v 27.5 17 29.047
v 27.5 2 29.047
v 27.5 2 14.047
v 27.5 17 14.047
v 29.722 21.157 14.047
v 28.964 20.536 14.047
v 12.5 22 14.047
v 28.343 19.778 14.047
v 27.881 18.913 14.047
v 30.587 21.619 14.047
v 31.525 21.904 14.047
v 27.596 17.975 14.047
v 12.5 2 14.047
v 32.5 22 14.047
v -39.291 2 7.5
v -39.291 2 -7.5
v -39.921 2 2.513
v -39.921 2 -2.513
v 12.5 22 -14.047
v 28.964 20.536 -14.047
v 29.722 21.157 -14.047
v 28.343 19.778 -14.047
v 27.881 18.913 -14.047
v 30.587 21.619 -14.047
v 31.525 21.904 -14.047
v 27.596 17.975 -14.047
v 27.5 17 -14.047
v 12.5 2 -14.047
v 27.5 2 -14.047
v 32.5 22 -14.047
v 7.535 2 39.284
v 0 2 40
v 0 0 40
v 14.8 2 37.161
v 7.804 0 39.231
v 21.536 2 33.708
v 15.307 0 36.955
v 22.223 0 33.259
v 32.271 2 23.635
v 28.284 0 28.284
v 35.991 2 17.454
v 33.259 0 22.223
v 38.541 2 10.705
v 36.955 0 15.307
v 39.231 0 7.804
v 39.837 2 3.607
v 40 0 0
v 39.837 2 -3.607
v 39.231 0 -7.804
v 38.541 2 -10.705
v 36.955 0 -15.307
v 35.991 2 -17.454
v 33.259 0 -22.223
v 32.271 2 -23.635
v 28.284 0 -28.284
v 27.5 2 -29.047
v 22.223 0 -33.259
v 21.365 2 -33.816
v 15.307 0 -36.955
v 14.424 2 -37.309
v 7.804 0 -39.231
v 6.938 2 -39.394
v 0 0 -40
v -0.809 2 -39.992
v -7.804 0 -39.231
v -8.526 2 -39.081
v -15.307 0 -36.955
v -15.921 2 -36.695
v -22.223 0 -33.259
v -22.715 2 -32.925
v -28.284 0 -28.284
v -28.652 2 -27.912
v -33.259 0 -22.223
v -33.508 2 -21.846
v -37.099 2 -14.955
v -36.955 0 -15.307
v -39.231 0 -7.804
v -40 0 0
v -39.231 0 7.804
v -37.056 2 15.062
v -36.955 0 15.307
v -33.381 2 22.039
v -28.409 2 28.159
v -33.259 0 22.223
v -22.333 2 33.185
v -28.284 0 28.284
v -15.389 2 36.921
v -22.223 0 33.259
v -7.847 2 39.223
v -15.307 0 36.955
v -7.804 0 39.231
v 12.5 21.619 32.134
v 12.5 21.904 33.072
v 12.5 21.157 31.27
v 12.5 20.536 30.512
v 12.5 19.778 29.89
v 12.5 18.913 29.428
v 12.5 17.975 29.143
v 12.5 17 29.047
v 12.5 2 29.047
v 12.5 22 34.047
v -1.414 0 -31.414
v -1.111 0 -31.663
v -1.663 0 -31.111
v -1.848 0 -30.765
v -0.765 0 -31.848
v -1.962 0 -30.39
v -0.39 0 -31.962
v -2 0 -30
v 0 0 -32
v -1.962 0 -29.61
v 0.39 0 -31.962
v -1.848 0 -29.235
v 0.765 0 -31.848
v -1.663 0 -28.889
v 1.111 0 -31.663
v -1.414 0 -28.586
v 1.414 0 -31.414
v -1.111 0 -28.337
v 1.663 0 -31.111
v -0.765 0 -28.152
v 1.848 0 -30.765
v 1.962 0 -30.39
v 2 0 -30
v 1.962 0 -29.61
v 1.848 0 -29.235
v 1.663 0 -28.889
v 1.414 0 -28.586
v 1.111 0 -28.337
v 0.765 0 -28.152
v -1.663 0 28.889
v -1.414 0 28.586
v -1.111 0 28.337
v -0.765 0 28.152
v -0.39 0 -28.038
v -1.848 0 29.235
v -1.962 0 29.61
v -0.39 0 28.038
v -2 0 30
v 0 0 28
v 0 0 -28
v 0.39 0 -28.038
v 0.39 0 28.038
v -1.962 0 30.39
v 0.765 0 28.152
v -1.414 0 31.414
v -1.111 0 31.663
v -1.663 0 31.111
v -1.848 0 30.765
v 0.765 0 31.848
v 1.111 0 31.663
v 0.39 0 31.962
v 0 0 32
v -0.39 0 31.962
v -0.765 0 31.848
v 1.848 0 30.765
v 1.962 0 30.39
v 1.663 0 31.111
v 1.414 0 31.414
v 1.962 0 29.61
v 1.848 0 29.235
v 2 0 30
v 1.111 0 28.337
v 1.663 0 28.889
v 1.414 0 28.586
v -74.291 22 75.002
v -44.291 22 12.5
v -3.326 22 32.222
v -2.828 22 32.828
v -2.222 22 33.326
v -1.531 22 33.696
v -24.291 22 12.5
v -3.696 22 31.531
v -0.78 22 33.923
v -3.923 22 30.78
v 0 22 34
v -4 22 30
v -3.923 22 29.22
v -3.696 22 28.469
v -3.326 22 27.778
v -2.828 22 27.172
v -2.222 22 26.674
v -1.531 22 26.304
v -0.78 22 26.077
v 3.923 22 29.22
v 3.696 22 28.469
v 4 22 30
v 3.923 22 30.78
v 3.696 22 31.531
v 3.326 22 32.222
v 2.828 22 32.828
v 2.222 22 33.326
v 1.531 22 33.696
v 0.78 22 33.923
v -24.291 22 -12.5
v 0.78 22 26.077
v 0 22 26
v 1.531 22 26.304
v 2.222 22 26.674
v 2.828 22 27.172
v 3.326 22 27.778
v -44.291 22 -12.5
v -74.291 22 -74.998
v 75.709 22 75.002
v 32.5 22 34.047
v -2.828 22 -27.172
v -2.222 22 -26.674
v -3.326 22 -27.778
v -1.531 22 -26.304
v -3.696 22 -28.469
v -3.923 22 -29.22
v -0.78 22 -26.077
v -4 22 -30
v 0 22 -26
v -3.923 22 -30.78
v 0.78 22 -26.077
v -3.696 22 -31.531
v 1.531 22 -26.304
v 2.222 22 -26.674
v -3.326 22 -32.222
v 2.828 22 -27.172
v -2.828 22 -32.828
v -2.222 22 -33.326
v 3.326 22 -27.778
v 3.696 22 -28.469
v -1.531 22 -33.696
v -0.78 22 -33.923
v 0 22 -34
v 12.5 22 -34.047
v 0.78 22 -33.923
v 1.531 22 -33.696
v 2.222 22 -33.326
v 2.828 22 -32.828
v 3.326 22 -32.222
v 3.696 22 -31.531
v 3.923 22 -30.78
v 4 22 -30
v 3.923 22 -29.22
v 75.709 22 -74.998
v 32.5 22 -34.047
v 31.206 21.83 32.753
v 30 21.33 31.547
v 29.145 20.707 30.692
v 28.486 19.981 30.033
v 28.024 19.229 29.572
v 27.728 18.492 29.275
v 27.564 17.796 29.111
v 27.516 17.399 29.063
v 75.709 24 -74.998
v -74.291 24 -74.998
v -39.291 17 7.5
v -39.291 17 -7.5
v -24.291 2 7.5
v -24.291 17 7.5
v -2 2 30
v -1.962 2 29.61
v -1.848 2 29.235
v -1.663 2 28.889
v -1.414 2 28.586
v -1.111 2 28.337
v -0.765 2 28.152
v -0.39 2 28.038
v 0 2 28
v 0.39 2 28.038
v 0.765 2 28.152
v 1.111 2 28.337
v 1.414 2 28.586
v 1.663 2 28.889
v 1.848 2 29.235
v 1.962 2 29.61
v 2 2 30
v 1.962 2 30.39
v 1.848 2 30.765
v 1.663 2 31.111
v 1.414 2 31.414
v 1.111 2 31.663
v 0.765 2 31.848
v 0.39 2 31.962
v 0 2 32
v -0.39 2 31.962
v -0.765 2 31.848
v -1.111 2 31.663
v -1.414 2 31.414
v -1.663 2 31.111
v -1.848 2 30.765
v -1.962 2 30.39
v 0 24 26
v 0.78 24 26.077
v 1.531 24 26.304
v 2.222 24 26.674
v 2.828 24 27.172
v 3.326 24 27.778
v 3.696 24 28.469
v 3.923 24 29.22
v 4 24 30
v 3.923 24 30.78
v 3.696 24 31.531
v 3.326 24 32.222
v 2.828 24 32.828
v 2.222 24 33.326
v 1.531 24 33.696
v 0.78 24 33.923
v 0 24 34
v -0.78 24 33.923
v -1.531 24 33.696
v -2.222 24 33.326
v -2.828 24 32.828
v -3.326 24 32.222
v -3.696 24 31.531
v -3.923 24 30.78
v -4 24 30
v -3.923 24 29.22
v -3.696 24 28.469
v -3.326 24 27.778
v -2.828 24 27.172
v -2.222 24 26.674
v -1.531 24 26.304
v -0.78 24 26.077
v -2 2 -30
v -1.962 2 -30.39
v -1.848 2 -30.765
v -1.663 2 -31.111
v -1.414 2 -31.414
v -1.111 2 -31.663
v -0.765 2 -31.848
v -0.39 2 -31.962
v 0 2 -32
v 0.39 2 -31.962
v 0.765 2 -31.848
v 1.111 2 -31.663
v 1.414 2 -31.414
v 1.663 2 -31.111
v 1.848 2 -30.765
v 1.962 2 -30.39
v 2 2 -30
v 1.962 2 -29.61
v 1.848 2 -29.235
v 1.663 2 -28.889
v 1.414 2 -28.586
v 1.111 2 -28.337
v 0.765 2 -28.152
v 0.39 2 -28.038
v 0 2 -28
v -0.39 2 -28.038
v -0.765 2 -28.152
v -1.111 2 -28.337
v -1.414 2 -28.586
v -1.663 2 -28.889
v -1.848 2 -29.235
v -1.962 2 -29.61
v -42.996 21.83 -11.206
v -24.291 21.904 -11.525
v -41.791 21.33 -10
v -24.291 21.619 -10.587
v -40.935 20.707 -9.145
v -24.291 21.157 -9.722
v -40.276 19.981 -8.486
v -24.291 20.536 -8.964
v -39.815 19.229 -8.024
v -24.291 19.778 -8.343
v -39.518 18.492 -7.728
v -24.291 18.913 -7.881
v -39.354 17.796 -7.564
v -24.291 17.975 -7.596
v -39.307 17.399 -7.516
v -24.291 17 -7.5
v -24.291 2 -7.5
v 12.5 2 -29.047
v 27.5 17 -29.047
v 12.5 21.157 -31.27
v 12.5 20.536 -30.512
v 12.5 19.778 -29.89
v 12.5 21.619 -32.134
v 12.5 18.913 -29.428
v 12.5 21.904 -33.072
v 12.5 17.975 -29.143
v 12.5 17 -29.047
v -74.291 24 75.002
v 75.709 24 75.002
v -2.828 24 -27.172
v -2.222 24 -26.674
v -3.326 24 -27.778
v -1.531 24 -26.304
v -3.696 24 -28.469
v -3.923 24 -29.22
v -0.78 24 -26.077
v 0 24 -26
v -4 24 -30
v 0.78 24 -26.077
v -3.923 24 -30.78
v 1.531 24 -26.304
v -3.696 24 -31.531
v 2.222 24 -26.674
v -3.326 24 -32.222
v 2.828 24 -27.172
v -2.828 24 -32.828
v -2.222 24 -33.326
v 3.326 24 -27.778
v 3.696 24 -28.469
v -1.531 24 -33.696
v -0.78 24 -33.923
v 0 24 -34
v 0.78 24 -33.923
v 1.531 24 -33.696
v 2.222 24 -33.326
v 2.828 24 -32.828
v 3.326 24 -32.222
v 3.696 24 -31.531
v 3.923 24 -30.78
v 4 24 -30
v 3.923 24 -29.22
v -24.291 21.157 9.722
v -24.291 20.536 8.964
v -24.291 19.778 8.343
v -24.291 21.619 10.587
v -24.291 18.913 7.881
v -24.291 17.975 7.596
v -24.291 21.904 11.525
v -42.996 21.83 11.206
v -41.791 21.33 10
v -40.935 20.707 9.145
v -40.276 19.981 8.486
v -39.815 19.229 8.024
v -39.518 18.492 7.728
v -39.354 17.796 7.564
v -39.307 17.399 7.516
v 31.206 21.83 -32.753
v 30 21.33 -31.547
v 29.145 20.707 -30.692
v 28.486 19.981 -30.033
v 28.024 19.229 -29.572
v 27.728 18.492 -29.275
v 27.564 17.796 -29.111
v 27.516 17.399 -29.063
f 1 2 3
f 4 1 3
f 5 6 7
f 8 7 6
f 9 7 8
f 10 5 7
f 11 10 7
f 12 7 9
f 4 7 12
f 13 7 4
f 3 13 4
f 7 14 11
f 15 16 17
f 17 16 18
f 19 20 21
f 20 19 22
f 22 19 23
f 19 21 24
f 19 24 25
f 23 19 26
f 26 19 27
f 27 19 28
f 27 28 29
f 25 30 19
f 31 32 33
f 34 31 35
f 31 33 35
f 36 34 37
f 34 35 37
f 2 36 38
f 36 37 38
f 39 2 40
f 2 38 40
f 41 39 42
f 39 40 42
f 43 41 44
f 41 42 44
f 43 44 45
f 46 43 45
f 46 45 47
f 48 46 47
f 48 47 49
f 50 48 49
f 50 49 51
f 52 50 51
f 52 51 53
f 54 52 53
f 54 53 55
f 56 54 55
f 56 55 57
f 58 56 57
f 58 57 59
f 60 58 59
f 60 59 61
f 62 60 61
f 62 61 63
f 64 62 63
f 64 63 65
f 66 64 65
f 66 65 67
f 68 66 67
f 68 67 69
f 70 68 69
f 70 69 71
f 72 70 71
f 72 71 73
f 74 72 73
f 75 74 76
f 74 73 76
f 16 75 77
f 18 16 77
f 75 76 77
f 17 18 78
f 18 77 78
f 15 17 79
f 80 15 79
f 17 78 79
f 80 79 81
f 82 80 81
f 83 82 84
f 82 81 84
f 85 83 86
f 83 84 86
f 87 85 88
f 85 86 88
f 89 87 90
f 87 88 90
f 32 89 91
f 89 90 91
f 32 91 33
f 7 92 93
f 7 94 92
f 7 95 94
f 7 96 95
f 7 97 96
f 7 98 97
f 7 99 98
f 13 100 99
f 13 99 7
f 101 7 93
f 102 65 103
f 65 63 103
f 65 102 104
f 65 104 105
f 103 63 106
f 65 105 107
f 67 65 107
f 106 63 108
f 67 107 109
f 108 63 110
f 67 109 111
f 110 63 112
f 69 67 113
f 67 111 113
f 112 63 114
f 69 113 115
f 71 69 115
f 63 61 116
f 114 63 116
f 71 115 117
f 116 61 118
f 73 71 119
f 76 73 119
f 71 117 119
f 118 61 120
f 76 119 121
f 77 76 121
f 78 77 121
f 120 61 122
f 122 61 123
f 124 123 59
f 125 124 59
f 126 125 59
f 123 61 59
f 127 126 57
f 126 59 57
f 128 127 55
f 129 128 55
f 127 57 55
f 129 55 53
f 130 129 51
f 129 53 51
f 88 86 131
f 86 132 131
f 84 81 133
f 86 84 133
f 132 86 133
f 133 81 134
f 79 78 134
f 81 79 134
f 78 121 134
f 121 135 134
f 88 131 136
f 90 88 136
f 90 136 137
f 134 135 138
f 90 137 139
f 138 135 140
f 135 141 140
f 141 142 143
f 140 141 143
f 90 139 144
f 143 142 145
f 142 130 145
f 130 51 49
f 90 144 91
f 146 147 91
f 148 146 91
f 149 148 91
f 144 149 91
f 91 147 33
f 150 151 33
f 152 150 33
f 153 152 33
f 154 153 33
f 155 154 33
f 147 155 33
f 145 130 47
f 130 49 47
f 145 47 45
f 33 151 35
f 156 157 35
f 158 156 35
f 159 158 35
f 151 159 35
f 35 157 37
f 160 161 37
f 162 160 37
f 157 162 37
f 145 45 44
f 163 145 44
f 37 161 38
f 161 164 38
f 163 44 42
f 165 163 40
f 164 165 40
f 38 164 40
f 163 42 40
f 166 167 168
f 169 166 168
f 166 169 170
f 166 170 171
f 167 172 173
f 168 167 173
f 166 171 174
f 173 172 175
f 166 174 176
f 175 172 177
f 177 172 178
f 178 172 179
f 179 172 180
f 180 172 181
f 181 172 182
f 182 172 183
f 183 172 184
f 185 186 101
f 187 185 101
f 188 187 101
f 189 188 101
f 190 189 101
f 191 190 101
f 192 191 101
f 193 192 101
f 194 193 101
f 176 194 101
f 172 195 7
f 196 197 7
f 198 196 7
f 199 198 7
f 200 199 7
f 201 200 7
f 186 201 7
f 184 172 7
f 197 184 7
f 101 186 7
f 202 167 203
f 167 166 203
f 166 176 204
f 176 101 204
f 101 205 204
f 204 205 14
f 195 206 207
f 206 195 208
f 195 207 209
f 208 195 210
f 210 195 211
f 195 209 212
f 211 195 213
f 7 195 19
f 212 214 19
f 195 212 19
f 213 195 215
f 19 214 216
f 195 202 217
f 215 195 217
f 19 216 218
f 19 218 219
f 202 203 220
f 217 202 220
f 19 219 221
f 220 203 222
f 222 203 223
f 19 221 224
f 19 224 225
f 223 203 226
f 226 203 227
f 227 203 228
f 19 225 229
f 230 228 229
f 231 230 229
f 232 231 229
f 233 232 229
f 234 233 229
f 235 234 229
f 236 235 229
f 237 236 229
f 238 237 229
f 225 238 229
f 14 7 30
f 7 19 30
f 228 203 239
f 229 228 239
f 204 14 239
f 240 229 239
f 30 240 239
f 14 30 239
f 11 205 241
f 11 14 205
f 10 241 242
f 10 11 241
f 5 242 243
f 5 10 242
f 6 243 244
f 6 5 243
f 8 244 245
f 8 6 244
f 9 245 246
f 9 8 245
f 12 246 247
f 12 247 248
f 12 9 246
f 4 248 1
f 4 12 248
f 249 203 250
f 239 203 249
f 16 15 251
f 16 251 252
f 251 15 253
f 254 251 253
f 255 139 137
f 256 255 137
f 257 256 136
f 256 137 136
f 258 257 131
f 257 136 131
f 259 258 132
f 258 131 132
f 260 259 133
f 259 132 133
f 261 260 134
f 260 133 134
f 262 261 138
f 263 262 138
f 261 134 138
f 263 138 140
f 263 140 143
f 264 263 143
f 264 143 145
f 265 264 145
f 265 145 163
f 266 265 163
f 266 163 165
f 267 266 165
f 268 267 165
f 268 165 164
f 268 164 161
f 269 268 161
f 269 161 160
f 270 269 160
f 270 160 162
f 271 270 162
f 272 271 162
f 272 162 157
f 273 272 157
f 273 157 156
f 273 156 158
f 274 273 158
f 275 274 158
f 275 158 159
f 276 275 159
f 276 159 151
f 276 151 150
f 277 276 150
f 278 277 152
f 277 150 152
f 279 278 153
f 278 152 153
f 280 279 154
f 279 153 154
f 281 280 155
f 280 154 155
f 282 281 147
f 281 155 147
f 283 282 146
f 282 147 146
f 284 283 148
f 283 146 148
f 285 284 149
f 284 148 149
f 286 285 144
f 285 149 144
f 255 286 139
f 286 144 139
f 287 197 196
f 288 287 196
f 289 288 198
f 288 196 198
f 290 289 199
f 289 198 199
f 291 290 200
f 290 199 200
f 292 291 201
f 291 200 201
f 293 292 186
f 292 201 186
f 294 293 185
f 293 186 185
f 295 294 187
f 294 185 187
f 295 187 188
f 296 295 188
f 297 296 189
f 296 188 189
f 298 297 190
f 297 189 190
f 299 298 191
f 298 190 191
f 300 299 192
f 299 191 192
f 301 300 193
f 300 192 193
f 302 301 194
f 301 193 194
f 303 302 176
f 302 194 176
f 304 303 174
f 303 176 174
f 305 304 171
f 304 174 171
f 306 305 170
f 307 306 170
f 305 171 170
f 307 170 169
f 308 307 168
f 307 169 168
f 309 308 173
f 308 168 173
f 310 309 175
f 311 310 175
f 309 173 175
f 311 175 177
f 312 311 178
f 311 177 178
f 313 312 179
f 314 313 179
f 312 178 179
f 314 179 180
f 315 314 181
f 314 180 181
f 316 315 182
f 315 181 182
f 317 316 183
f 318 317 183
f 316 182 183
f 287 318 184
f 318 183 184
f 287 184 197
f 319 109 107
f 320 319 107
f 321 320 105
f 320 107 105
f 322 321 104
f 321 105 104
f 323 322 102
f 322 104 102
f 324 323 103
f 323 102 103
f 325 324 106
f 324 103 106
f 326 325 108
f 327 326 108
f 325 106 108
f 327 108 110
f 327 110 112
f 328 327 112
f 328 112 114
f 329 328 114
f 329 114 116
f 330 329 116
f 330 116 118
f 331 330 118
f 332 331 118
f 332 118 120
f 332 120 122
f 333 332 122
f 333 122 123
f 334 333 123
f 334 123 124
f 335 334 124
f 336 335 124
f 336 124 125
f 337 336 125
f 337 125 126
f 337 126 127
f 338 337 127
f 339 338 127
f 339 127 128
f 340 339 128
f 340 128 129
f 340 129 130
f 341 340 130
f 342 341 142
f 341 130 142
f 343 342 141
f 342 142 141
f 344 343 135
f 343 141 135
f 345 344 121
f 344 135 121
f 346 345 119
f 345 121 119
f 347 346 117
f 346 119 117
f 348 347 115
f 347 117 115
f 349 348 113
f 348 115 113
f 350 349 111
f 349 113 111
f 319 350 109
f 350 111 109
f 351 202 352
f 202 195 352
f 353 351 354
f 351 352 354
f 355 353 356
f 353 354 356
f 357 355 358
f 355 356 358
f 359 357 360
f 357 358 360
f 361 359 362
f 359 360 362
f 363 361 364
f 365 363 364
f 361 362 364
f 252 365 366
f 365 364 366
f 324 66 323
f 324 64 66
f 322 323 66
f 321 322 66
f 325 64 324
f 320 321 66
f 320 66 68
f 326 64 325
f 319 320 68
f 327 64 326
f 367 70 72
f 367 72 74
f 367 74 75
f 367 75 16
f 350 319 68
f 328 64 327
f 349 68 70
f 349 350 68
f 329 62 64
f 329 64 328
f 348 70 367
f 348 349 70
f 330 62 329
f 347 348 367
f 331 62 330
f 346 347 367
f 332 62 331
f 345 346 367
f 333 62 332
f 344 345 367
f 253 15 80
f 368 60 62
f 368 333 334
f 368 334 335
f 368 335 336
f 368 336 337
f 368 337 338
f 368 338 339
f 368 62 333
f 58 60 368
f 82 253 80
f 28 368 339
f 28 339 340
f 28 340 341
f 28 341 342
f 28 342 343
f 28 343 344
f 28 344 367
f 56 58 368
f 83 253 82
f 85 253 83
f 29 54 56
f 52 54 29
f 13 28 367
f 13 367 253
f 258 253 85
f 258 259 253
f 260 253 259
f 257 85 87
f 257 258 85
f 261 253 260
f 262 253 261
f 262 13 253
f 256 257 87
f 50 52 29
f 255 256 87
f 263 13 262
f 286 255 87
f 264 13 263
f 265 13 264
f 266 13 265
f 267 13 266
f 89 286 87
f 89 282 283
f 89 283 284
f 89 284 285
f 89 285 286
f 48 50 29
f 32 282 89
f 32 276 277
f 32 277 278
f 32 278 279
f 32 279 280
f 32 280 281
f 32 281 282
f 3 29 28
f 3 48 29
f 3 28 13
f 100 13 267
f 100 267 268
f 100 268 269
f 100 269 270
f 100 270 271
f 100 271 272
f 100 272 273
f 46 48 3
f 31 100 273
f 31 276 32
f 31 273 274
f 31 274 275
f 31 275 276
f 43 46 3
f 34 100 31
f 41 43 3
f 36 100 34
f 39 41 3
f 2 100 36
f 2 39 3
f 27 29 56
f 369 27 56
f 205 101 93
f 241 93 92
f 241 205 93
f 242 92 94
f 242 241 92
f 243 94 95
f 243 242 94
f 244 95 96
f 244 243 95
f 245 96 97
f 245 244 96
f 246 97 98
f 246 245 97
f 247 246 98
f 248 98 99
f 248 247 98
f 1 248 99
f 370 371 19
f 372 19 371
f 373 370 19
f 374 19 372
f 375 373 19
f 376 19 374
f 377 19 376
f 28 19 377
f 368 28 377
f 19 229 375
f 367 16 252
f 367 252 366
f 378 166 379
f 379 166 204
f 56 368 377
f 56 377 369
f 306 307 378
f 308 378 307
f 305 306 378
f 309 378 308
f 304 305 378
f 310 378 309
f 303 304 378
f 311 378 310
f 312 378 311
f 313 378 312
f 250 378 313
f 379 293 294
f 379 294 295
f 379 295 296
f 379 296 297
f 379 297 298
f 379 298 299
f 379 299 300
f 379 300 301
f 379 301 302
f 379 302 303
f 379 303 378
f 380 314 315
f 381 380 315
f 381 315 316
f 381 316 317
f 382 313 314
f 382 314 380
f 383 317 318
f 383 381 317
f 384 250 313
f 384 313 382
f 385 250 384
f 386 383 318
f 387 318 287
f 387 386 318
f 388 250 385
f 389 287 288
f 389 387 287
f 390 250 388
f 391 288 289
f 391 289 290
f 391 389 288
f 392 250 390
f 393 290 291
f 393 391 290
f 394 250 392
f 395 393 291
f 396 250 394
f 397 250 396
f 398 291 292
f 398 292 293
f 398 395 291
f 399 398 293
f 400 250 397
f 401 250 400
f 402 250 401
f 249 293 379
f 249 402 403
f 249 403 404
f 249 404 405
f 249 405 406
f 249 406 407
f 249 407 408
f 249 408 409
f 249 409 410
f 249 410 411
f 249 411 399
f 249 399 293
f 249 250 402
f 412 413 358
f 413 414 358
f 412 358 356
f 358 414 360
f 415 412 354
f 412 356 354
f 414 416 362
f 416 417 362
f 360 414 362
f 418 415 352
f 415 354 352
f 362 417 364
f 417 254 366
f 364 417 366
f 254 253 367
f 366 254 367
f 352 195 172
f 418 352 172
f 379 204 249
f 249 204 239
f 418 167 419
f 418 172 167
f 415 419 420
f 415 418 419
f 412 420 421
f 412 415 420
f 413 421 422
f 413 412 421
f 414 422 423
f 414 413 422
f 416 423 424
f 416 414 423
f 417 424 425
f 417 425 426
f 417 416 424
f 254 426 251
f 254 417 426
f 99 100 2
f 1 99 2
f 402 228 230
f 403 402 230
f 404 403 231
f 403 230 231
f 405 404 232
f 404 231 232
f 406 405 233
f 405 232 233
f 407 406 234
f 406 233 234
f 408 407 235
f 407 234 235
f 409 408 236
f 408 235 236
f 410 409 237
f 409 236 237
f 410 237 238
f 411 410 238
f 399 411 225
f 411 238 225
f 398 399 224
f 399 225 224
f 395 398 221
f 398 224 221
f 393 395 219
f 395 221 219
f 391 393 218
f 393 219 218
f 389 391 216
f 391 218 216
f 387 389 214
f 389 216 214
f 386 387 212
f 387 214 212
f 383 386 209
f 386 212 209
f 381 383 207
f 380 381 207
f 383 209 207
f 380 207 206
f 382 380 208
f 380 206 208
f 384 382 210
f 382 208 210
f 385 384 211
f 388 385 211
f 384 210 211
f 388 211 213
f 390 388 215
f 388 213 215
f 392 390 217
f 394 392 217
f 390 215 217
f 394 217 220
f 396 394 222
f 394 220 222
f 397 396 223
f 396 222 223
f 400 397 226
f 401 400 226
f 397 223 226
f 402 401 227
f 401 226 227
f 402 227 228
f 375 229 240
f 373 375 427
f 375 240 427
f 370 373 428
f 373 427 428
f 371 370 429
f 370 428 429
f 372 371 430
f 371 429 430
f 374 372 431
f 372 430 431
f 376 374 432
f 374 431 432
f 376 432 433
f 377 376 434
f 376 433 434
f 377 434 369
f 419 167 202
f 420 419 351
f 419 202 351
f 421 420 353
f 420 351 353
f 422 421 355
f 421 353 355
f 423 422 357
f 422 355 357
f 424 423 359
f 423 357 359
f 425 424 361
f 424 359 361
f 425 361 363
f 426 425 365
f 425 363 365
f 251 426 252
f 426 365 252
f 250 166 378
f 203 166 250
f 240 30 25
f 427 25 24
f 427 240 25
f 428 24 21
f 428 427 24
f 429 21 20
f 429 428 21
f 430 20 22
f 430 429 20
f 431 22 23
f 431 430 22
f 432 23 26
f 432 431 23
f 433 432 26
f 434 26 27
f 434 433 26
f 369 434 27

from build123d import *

# Parameters (mm, degrees)
SKETCH1_R                 = 40
BOSS_EXTRUDE1_DEPTH       = 2
F_4_0MM_DOWEL_HOLE1_D     = 4
F_4_0MM_DOWEL_HOLE1_DEPTH = 15
F_4_0MM_DOWEL_HOLE1_TIP   = 1.201721238
SKETCH9_W                 = 15
SKETCH9_H                 = 15
BOSS_EXTRUDE19_DEPTH      = 20
SKETCH10_W                = 150
SKETCH10_H                = 150
BOSS_EXTRUDE20_DEPTH      = 2
SKETCH11_R                = 4
CUT_EXTRUDE1_DEPTH        = 2
FILLET2_R                 = 5


with BuildPart() as part:
    # Sketch1 → Boss-Extrude1 (new body)
    with BuildSketch(Plane(origin=(0, 0, 0), x_dir=(1, 0, 0), z_dir=(0, 1, 0))):
        with Locations(Location((0, 0, 0), (0, 0, 270))):
            Circle(SKETCH1_R)
    extrude(amount=BOSS_EXTRUDE1_DEPTH)

    # Ø4.0mm Dowel Hole1
    with Locations(Plane(origin=(0, 2, 0), x_dir=(1, 0, 0), z_dir=(0, 1, 0))):
        with Locations((0, 30), (0, -30)):
            Hole(F_4_0MM_DOWEL_HOLE1_D / 2, depth=F_4_0MM_DOWEL_HOLE1_DEPTH)
            with Locations((0, 0, -(F_4_0MM_DOWEL_HOLE1_DEPTH + F_4_0MM_DOWEL_HOLE1_TIP / 2))):  # 118° drill point
                Cone(0, F_4_0MM_DOWEL_HOLE1_D / 2, F_4_0MM_DOWEL_HOLE1_TIP, mode=Mode.SUBTRACT)

    # Sketch9 → Boss-Extrude19 (add)
    with BuildSketch(Plane(origin=(0, 2, 0), x_dir=(1, 0, 0), z_dir=(0, 1, 0))):
        with Locations((-31.790584114, 0)):
            Rectangle(SKETCH9_W, SKETCH9_H)
        with Locations((20, -21.547375097)):
            Rectangle(SKETCH9_W, SKETCH9_H)
        with Locations((20, 21.547375097)):
            Rectangle(SKETCH9_W, SKETCH9_H)
    extrude(amount=BOSS_EXTRUDE19_DEPTH)

    # Sketch10 → Boss-Extrude20 (add)
    with BuildSketch(Plane(origin=(0, 22, 0), x_dir=(1, 0, 0), z_dir=(0, 1, 0))):
        with Locations((0.709415886, -0.002124903)):
            Rectangle(SKETCH10_W, SKETCH10_H)
    extrude(amount=BOSS_EXTRUDE20_DEPTH)

    # Sketch11 → Cut-Extrude1 (cut)
    with BuildSketch(Plane.XZ.offset(-22)):
        with Locations(Location((0, 30, 0), (0, 0, 270))):
            Circle(SKETCH11_R)
        with Locations(Location((0, -30, 0), (0, 0, 270))):
            Circle(SKETCH11_R)
    extrude(amount=-CUT_EXTRUDE1_DEPTH, mode=Mode.SUBTRACT)

    # Fillet2
    fillet2_edges = [part.edges().sort_by_distance(p)[0] for p in [
        (-39.290584114, 22, 0),
        (-31.790584114, 22, 7.5),
        (-31.790584114, 22, -7.5),
        (27.5, 22, 21.547375097),
        (20, 22, 29.047375097),
        (20, 22, -29.047375097),
        (27.5, 22, -21.547375097),
    ]]
    fillet(fillet2_edges, radius=FILLET2_R)


solid = part.part
